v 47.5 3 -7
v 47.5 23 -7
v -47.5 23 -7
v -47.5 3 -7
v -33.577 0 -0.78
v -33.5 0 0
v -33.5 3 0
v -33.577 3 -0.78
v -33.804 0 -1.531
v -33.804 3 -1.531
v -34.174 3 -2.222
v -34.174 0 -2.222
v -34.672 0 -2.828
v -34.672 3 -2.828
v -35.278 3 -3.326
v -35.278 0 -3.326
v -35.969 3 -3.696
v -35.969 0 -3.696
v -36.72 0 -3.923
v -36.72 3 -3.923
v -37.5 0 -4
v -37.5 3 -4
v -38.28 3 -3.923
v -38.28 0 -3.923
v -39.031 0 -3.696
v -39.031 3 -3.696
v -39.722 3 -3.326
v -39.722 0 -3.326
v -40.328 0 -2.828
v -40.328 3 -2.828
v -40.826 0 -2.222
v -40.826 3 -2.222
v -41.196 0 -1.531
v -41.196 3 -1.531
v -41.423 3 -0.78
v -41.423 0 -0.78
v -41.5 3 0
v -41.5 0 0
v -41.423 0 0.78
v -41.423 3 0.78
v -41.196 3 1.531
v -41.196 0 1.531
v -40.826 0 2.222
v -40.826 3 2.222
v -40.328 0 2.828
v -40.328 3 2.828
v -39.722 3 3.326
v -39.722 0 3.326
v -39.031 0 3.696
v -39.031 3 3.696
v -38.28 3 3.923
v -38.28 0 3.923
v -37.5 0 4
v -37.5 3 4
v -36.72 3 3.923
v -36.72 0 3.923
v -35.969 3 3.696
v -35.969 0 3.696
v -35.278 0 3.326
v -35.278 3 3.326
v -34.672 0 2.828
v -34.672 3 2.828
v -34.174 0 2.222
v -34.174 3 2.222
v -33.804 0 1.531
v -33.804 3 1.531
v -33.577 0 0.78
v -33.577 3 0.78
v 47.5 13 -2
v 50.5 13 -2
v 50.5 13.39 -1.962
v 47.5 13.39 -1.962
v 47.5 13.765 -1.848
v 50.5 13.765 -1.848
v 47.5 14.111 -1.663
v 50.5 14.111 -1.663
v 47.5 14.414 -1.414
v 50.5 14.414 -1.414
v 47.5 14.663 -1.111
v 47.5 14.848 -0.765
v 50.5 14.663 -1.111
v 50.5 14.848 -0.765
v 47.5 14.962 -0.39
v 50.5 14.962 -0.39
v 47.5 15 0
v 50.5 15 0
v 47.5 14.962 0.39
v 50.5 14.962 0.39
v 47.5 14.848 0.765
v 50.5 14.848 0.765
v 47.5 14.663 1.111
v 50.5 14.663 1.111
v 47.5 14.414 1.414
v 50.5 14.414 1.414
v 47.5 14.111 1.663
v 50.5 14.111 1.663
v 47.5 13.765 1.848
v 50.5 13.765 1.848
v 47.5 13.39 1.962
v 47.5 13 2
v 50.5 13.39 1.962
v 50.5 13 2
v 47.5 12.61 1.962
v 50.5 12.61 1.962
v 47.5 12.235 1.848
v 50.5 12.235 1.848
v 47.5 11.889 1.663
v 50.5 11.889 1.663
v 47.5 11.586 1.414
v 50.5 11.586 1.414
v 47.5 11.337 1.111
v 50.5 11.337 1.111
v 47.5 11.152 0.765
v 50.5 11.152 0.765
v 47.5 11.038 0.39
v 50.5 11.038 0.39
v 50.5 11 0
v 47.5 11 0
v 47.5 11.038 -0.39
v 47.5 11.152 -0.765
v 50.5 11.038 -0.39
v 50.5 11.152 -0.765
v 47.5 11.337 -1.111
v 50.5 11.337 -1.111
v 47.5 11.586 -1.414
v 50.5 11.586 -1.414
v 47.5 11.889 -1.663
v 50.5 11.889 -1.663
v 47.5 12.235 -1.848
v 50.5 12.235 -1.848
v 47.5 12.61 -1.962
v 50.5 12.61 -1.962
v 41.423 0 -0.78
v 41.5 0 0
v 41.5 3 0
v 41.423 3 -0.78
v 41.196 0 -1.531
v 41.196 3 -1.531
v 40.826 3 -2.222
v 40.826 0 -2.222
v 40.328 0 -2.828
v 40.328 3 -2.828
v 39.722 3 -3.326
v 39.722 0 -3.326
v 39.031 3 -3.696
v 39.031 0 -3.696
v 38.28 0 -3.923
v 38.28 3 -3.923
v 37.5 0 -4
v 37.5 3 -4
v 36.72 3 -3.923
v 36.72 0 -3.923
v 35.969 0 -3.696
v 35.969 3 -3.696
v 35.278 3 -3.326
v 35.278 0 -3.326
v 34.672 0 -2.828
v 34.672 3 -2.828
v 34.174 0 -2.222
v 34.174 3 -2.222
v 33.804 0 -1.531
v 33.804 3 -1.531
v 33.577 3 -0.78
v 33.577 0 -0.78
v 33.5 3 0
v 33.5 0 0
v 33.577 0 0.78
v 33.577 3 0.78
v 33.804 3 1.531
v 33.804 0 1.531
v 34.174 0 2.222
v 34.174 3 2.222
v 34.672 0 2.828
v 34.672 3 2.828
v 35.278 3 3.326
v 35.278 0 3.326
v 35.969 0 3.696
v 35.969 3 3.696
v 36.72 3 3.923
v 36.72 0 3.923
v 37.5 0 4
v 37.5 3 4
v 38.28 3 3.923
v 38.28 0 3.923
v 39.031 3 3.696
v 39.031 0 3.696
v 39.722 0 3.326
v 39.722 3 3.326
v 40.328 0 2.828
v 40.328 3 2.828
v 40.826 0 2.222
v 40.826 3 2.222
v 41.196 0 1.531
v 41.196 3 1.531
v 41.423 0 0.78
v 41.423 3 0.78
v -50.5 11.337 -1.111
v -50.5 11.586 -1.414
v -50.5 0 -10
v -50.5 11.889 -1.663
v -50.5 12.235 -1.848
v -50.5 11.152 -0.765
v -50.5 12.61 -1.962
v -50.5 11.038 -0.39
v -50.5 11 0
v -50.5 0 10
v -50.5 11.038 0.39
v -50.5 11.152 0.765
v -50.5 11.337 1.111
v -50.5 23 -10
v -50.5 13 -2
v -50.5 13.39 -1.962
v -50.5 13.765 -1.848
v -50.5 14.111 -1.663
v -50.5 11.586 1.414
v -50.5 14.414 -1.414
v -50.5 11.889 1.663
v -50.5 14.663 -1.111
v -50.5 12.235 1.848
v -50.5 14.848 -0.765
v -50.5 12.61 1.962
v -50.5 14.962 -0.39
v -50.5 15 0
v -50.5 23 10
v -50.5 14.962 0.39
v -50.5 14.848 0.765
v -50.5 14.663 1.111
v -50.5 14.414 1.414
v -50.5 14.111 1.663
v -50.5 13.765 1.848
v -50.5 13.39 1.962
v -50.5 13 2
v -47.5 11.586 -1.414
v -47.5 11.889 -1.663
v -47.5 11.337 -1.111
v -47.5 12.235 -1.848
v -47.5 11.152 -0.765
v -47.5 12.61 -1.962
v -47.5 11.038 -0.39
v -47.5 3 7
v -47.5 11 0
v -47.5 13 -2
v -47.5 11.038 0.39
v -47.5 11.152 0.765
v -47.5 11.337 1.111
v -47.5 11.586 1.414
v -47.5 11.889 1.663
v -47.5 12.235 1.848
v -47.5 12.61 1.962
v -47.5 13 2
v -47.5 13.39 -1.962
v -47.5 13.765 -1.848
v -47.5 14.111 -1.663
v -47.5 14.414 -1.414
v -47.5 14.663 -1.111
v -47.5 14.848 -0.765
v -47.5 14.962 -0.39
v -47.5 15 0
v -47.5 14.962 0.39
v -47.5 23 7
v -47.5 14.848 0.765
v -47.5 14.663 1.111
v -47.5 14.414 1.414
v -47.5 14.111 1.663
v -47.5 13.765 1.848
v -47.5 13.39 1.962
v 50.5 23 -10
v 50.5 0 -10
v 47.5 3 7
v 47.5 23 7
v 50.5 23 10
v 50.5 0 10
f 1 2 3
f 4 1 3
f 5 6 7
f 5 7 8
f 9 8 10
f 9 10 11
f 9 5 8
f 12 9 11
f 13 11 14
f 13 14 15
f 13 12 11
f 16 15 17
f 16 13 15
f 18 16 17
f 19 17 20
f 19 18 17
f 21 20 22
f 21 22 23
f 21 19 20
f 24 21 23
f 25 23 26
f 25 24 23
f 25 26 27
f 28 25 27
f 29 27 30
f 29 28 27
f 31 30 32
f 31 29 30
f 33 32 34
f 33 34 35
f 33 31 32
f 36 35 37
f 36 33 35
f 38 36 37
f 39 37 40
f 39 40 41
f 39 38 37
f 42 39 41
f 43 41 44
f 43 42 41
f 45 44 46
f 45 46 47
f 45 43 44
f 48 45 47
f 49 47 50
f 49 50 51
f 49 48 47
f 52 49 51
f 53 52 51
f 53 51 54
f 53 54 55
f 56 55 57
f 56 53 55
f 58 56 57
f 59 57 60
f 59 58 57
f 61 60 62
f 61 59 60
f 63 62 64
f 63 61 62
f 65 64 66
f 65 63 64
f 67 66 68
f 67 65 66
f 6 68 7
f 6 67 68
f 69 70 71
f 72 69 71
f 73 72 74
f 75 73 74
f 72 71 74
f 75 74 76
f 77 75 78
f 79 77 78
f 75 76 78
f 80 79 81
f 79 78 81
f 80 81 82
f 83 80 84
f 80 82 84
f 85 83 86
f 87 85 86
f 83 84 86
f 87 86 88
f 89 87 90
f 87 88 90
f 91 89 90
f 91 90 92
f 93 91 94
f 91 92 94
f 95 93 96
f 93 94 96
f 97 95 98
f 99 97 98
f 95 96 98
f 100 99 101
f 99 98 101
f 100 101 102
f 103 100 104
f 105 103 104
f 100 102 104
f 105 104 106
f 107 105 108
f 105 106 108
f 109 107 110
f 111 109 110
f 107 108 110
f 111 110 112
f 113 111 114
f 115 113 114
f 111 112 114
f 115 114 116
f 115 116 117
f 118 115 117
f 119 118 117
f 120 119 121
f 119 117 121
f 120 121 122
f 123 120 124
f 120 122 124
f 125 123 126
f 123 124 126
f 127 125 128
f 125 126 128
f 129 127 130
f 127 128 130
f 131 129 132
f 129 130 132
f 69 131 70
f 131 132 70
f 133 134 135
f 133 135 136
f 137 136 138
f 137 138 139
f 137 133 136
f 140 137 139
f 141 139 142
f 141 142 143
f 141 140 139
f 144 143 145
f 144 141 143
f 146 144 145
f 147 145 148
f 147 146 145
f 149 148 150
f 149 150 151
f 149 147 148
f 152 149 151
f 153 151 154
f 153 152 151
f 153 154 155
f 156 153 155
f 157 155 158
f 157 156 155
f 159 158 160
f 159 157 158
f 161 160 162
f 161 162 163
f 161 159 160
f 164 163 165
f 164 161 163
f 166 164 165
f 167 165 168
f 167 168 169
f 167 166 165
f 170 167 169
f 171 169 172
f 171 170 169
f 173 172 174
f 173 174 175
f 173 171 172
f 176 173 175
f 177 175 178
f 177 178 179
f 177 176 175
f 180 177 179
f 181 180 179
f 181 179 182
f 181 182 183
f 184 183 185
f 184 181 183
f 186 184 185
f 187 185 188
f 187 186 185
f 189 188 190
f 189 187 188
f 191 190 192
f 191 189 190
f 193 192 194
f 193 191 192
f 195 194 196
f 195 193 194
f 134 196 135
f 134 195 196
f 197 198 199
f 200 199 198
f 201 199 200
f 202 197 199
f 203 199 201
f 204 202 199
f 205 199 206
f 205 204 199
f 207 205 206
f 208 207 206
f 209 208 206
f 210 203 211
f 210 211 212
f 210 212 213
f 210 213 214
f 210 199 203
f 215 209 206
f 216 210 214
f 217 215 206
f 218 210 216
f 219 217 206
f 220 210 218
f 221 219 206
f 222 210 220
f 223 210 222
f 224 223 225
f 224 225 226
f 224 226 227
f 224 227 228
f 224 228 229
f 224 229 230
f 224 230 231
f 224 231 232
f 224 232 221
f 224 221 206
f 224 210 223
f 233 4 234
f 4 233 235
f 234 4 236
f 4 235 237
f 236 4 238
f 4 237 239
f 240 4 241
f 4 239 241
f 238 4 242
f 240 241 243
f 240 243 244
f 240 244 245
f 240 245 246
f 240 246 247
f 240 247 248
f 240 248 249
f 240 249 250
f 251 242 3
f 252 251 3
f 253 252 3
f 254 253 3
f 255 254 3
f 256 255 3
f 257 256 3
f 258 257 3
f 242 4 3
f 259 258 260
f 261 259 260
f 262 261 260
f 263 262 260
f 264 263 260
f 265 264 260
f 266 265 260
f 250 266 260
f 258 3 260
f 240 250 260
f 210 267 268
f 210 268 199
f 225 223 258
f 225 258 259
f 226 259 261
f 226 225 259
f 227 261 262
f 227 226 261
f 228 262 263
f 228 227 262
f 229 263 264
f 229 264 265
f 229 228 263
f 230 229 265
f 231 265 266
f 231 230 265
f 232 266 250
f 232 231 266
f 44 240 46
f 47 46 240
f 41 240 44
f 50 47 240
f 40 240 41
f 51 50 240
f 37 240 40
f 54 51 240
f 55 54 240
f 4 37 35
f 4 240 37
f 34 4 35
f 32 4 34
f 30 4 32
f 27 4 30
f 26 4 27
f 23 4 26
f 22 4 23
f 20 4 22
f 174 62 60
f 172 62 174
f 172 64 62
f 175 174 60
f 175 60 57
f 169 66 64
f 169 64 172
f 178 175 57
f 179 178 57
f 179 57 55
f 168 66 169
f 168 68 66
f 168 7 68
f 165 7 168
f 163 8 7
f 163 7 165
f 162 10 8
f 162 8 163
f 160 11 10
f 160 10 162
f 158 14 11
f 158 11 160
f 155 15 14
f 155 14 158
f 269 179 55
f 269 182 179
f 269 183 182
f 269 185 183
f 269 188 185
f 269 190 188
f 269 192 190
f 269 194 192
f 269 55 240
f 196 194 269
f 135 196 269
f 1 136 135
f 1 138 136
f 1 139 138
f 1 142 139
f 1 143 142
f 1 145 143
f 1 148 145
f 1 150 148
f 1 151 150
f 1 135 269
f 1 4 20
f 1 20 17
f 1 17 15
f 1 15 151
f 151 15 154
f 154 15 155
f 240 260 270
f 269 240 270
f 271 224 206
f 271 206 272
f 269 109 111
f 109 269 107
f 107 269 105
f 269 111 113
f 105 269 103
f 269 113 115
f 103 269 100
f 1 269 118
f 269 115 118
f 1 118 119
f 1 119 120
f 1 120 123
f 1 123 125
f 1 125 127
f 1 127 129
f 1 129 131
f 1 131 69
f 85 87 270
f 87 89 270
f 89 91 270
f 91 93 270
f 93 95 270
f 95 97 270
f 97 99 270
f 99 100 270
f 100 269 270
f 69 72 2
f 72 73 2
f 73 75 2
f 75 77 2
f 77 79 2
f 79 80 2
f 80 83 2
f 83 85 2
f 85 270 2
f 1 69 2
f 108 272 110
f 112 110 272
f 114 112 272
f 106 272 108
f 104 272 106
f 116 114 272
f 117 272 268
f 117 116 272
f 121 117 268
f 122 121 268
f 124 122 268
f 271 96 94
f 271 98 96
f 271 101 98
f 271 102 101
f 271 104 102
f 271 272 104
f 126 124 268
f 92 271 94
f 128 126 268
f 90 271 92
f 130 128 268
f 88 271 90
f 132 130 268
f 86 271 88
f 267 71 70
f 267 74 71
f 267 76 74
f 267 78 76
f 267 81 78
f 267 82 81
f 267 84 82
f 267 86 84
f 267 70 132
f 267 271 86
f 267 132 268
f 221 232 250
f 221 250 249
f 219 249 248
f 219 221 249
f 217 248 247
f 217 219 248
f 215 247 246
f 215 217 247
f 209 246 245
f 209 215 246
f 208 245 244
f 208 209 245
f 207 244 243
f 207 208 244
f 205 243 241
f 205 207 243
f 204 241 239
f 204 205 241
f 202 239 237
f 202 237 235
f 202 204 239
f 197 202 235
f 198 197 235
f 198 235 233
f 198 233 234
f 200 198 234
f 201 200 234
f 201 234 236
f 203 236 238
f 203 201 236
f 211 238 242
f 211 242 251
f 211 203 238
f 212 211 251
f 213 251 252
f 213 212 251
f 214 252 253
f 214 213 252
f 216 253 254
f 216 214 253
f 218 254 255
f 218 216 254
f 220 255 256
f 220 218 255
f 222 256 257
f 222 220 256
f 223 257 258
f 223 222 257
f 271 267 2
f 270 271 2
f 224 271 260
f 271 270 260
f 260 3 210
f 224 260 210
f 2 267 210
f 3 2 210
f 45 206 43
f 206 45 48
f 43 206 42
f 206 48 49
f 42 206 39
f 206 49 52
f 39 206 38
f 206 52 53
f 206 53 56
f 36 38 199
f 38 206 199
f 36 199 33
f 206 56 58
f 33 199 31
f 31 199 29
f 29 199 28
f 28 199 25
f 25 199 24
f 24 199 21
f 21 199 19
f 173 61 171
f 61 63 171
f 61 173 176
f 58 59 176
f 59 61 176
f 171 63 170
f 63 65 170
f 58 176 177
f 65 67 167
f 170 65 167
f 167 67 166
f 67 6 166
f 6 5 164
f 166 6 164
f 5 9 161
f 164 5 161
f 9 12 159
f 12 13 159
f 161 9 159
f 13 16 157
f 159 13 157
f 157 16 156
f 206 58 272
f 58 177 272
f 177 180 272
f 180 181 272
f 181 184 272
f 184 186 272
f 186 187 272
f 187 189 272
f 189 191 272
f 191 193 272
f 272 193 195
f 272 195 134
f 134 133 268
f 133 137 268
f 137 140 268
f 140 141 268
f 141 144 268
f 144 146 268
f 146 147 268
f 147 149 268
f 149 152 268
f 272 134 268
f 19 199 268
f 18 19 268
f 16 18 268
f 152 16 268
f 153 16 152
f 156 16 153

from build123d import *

# Parameters (mm, degrees)
SKETCH_1_W      = 101
SKETCH_1_H      = 20
SKETCH_1_R      = 4
EXTRUDE_1_DEPTH = 3
EXTRUDE_2_DEPTH = 3
SKETCH_3_W      = 20
SKETCH_3_H      = 20
SKETCH_3_R      = 2
EXTRUDE_3_DEPTH = 3
SKETCH_4_W      = 95
SKETCH_4_H      = 20
EXTRUDE_4_DEPTH = 3
SKETCH_5_W      = 95
SKETCH_5_H      = 20
EXTRUDE_5_DEPTH = 3


with BuildPart() as part:
    # 草图1 → 凸台-拉伸1 (new body)
    with BuildSketch(Plane(origin=(0, 0, 0), x_dir=(1, 0, 0), z_dir=(0, 1, 0))):
        Rectangle(SKETCH_1_W, SKETCH_1_H)
        with Locations((-37.5, 0)):
            Circle(SKETCH_1_R, mode=Mode.SUBTRACT)
        with Locations((37.5, 0)):
            Circle(SKETCH_1_R, mode=Mode.SUBTRACT)
    extrude(amount=EXTRUDE_1_DEPTH)

    # 草图2 → 凸台-拉伸2 (add)
    with BuildSketch(Plane.ZY.offset(50.5)):
        Polygon((-10, 23), (-10, 3), (10, 3), (10, 23), (0, 23), align=None)
        with BuildLine():
            ThreePointArc((2, 13), (-1.414213562, 11.585786438), (0, 15))
            ThreePointArc((0, 15), (1.414213562, 14.414213562), (2, 13))
        make_face(mode=Mode.SUBTRACT)
    extrude(amount=-EXTRUDE_2_DEPTH)

    # 草图3 → 凸台-拉伸3 (add)
    with BuildSketch(Plane(origin=(50.5, 0, 0), x_dir=(0, 0, -1), z_dir=(1, 0, 0))):
        with Locations((0, 13)):
            Rectangle(SKETCH_3_W, SKETCH_3_H)
        with Locations((0, 13)):
            Circle(SKETCH_3_R, mode=Mode.SUBTRACT)
    extrude(amount=-EXTRUDE_3_DEPTH)

    # 草图4 → 凸台-拉伸4 (add)
    with BuildSketch(Plane.XY.offset(10)):
        with Locations((0, 13)):
            Rectangle(SKETCH_4_W, SKETCH_4_H)
    extrude(amount=-EXTRUDE_4_DEPTH)

    # 草图5 → 凸台-拉伸5 (add)
    with BuildSketch(Plane(origin=(0, 0, -10), x_dir=(-1, 0, 0), z_dir=(0, 0, -1))):
        with Locations((0, 13)):
            Rectangle(SKETCH_5_W, SKETCH_5_H)
    extrude(amount=-EXTRUDE_5_DEPTH)


solid = part.part
